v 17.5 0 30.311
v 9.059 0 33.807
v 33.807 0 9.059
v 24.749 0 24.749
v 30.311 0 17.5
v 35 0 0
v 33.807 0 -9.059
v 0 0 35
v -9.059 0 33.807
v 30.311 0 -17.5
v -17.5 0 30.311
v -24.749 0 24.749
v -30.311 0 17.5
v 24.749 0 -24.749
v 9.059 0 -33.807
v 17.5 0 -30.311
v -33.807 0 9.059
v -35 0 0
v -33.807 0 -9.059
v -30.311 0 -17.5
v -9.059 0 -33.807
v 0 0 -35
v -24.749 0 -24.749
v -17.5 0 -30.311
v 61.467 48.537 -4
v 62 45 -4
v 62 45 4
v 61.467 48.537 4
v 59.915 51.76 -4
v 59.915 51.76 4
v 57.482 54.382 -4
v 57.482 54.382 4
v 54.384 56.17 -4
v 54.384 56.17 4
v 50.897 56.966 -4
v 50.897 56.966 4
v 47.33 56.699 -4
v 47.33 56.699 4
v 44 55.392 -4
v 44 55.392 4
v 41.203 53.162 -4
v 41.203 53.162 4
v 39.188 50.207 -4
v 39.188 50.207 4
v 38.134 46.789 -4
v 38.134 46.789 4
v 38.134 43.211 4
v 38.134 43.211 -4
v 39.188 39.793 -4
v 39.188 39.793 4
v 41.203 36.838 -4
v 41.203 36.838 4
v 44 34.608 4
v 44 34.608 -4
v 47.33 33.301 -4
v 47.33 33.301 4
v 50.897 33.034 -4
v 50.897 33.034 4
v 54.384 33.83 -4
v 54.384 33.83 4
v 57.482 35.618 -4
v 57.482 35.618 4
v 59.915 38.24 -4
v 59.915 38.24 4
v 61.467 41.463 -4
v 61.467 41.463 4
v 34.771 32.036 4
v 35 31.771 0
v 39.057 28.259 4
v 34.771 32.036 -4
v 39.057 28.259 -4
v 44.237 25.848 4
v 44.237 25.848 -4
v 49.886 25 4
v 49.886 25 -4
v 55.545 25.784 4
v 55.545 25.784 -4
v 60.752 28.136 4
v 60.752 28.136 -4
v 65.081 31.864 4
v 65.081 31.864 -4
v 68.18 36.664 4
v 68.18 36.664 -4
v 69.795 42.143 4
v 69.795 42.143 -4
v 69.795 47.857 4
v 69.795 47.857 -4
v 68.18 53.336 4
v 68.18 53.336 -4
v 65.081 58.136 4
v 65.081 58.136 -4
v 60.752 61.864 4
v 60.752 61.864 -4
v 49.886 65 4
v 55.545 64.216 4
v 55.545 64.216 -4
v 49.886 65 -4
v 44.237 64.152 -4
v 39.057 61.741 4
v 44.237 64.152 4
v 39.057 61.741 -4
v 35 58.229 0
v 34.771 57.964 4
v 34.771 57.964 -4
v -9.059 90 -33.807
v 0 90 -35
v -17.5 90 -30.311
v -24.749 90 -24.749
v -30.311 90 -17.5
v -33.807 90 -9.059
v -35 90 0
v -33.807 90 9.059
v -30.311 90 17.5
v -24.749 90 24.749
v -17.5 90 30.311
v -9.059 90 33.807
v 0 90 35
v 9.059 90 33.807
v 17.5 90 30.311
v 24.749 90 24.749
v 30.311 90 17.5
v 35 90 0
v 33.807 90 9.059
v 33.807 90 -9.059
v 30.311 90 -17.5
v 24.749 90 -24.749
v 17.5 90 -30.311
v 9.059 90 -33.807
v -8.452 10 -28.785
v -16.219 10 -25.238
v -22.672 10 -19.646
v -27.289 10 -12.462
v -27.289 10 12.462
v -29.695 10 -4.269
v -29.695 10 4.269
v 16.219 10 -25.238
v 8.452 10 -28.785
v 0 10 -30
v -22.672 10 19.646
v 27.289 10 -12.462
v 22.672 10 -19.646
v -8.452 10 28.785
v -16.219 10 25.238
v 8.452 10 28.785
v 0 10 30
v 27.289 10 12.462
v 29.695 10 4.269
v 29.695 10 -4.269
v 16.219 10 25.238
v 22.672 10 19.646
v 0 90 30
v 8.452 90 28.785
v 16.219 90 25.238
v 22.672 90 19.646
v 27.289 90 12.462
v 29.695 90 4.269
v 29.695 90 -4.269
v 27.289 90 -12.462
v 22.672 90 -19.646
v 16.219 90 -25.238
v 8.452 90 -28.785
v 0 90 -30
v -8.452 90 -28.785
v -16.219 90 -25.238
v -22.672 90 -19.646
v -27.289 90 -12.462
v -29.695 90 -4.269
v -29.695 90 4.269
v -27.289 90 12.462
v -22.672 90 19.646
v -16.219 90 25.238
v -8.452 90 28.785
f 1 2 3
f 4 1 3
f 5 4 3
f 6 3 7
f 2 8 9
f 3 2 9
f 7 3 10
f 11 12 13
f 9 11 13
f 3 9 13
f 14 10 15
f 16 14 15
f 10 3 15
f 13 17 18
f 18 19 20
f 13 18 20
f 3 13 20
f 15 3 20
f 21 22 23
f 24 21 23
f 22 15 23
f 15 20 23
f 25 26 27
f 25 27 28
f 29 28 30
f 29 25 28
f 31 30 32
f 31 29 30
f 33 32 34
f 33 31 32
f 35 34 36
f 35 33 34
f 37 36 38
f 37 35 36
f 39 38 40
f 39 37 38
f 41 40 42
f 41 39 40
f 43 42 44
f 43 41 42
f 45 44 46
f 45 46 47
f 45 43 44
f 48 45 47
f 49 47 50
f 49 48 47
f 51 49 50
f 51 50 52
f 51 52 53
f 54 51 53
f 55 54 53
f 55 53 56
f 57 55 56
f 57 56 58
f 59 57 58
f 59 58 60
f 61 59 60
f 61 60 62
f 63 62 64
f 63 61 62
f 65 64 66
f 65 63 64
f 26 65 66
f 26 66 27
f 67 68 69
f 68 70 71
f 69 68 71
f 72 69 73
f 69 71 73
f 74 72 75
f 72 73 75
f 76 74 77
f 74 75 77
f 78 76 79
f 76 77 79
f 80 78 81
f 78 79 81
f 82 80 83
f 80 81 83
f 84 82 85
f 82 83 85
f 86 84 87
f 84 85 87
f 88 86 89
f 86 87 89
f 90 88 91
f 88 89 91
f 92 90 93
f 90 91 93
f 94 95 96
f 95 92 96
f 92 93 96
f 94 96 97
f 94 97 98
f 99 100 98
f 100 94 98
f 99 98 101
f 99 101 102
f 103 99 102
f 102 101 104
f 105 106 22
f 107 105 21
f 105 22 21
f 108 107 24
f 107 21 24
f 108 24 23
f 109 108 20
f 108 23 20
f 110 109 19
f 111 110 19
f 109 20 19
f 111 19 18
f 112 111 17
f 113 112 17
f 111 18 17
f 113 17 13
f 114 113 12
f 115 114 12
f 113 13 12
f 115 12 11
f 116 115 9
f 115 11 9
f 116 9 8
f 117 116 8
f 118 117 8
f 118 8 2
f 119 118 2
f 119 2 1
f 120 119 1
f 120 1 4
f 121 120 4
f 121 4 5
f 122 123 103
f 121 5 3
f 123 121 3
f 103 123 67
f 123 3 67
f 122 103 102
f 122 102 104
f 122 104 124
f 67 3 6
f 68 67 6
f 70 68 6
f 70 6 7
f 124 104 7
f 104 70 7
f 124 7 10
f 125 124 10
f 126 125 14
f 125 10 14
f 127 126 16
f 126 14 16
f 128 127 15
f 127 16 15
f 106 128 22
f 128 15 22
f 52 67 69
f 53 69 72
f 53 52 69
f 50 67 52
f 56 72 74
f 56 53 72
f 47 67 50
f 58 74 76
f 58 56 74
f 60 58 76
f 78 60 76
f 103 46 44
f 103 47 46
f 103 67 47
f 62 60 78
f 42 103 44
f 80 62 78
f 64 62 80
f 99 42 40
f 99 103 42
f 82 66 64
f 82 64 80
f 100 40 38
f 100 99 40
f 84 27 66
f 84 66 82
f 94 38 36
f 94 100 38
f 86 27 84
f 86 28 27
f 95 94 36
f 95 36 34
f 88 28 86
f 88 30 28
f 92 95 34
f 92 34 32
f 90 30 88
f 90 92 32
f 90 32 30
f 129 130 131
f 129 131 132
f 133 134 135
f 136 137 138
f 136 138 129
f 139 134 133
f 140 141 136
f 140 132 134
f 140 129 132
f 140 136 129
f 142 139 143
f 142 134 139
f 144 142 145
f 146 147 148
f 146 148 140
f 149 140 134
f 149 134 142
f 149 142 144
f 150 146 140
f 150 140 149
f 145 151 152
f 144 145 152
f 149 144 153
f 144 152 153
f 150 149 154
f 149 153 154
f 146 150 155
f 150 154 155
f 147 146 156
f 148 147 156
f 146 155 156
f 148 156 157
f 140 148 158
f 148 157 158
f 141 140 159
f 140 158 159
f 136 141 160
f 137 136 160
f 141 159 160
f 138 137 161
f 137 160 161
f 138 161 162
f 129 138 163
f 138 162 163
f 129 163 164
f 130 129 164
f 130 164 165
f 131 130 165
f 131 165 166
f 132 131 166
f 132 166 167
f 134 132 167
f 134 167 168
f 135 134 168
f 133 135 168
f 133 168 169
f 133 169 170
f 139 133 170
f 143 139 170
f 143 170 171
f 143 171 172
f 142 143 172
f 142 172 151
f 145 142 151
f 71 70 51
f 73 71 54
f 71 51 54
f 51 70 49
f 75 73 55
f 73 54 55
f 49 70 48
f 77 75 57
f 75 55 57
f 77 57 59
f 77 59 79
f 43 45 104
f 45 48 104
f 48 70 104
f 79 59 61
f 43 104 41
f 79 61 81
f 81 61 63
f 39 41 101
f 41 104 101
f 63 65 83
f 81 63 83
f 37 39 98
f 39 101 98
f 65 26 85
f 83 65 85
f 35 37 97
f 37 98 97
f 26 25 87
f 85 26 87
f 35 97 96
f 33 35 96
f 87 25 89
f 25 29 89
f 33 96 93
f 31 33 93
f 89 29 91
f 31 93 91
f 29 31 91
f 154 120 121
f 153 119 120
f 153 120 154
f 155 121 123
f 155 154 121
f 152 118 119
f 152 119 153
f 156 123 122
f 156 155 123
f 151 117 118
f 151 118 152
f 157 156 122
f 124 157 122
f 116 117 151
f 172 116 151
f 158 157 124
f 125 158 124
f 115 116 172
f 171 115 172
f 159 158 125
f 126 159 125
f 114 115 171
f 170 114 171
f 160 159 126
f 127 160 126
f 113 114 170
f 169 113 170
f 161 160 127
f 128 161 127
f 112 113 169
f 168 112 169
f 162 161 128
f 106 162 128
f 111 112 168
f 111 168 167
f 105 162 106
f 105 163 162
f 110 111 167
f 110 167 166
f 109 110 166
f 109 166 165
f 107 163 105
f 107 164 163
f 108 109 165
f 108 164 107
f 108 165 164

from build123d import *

# Parameters (mm, degrees)
SKETCH_1_R            = 35
EXTRUDE_1_DEPTH       = 90
SKETCH_3_R            = 30
CUT_EXTRUDE_1_DEPTH   = 80
EXTRUDE_START         = -4
EXTRUDE_3_OUTLINE_R   = 20
EXTRUDE_3_OUTLINE_R_2 = 12
EXTRUDE_3_DEPTH       = 8


# Read off the part's stored shape, not the designer's step: 凸台-拉伸3
with BuildPart() as part:
    # 草图1 → 凸台-拉伸1 (new body)
    with BuildSketch(Plane(origin=(0, 0, 0), x_dir=(1, 0, 0), z_dir=(0, 1, 0))):
        with Locations(Location((0, 0, 0), (0, 0, 90))):
            Circle(SKETCH_1_R)
    extrude(amount=EXTRUDE_1_DEPTH)

    # 草图3 → 切除-拉伸1 (cut)
    with BuildSketch(Plane(origin=(0, 90, 0), x_dir=(1, 0, 0), z_dir=(0, 1, 0))):
        with Locations(Location((0, 0, 0), (0, 0, 270))):
            Circle(SKETCH_3_R)
    extrude(amount=-CUT_EXTRUDE_1_DEPTH, mode=Mode.SUBTRACT)

    # 凸台-拉伸3 outline → 凸台-拉伸3 (add)
    with BuildSketch(Plane.XY.offset(EXTRUDE_START)):
        with Locations((50, 45)):
            Circle(EXTRUDE_3_OUTLINE_R)
        with Locations((50, 45)):
            Circle(EXTRUDE_3_OUTLINE_R_2, mode=Mode.SUBTRACT)
    extrude(amount=EXTRUDE_3_DEPTH)


solid = part.part
